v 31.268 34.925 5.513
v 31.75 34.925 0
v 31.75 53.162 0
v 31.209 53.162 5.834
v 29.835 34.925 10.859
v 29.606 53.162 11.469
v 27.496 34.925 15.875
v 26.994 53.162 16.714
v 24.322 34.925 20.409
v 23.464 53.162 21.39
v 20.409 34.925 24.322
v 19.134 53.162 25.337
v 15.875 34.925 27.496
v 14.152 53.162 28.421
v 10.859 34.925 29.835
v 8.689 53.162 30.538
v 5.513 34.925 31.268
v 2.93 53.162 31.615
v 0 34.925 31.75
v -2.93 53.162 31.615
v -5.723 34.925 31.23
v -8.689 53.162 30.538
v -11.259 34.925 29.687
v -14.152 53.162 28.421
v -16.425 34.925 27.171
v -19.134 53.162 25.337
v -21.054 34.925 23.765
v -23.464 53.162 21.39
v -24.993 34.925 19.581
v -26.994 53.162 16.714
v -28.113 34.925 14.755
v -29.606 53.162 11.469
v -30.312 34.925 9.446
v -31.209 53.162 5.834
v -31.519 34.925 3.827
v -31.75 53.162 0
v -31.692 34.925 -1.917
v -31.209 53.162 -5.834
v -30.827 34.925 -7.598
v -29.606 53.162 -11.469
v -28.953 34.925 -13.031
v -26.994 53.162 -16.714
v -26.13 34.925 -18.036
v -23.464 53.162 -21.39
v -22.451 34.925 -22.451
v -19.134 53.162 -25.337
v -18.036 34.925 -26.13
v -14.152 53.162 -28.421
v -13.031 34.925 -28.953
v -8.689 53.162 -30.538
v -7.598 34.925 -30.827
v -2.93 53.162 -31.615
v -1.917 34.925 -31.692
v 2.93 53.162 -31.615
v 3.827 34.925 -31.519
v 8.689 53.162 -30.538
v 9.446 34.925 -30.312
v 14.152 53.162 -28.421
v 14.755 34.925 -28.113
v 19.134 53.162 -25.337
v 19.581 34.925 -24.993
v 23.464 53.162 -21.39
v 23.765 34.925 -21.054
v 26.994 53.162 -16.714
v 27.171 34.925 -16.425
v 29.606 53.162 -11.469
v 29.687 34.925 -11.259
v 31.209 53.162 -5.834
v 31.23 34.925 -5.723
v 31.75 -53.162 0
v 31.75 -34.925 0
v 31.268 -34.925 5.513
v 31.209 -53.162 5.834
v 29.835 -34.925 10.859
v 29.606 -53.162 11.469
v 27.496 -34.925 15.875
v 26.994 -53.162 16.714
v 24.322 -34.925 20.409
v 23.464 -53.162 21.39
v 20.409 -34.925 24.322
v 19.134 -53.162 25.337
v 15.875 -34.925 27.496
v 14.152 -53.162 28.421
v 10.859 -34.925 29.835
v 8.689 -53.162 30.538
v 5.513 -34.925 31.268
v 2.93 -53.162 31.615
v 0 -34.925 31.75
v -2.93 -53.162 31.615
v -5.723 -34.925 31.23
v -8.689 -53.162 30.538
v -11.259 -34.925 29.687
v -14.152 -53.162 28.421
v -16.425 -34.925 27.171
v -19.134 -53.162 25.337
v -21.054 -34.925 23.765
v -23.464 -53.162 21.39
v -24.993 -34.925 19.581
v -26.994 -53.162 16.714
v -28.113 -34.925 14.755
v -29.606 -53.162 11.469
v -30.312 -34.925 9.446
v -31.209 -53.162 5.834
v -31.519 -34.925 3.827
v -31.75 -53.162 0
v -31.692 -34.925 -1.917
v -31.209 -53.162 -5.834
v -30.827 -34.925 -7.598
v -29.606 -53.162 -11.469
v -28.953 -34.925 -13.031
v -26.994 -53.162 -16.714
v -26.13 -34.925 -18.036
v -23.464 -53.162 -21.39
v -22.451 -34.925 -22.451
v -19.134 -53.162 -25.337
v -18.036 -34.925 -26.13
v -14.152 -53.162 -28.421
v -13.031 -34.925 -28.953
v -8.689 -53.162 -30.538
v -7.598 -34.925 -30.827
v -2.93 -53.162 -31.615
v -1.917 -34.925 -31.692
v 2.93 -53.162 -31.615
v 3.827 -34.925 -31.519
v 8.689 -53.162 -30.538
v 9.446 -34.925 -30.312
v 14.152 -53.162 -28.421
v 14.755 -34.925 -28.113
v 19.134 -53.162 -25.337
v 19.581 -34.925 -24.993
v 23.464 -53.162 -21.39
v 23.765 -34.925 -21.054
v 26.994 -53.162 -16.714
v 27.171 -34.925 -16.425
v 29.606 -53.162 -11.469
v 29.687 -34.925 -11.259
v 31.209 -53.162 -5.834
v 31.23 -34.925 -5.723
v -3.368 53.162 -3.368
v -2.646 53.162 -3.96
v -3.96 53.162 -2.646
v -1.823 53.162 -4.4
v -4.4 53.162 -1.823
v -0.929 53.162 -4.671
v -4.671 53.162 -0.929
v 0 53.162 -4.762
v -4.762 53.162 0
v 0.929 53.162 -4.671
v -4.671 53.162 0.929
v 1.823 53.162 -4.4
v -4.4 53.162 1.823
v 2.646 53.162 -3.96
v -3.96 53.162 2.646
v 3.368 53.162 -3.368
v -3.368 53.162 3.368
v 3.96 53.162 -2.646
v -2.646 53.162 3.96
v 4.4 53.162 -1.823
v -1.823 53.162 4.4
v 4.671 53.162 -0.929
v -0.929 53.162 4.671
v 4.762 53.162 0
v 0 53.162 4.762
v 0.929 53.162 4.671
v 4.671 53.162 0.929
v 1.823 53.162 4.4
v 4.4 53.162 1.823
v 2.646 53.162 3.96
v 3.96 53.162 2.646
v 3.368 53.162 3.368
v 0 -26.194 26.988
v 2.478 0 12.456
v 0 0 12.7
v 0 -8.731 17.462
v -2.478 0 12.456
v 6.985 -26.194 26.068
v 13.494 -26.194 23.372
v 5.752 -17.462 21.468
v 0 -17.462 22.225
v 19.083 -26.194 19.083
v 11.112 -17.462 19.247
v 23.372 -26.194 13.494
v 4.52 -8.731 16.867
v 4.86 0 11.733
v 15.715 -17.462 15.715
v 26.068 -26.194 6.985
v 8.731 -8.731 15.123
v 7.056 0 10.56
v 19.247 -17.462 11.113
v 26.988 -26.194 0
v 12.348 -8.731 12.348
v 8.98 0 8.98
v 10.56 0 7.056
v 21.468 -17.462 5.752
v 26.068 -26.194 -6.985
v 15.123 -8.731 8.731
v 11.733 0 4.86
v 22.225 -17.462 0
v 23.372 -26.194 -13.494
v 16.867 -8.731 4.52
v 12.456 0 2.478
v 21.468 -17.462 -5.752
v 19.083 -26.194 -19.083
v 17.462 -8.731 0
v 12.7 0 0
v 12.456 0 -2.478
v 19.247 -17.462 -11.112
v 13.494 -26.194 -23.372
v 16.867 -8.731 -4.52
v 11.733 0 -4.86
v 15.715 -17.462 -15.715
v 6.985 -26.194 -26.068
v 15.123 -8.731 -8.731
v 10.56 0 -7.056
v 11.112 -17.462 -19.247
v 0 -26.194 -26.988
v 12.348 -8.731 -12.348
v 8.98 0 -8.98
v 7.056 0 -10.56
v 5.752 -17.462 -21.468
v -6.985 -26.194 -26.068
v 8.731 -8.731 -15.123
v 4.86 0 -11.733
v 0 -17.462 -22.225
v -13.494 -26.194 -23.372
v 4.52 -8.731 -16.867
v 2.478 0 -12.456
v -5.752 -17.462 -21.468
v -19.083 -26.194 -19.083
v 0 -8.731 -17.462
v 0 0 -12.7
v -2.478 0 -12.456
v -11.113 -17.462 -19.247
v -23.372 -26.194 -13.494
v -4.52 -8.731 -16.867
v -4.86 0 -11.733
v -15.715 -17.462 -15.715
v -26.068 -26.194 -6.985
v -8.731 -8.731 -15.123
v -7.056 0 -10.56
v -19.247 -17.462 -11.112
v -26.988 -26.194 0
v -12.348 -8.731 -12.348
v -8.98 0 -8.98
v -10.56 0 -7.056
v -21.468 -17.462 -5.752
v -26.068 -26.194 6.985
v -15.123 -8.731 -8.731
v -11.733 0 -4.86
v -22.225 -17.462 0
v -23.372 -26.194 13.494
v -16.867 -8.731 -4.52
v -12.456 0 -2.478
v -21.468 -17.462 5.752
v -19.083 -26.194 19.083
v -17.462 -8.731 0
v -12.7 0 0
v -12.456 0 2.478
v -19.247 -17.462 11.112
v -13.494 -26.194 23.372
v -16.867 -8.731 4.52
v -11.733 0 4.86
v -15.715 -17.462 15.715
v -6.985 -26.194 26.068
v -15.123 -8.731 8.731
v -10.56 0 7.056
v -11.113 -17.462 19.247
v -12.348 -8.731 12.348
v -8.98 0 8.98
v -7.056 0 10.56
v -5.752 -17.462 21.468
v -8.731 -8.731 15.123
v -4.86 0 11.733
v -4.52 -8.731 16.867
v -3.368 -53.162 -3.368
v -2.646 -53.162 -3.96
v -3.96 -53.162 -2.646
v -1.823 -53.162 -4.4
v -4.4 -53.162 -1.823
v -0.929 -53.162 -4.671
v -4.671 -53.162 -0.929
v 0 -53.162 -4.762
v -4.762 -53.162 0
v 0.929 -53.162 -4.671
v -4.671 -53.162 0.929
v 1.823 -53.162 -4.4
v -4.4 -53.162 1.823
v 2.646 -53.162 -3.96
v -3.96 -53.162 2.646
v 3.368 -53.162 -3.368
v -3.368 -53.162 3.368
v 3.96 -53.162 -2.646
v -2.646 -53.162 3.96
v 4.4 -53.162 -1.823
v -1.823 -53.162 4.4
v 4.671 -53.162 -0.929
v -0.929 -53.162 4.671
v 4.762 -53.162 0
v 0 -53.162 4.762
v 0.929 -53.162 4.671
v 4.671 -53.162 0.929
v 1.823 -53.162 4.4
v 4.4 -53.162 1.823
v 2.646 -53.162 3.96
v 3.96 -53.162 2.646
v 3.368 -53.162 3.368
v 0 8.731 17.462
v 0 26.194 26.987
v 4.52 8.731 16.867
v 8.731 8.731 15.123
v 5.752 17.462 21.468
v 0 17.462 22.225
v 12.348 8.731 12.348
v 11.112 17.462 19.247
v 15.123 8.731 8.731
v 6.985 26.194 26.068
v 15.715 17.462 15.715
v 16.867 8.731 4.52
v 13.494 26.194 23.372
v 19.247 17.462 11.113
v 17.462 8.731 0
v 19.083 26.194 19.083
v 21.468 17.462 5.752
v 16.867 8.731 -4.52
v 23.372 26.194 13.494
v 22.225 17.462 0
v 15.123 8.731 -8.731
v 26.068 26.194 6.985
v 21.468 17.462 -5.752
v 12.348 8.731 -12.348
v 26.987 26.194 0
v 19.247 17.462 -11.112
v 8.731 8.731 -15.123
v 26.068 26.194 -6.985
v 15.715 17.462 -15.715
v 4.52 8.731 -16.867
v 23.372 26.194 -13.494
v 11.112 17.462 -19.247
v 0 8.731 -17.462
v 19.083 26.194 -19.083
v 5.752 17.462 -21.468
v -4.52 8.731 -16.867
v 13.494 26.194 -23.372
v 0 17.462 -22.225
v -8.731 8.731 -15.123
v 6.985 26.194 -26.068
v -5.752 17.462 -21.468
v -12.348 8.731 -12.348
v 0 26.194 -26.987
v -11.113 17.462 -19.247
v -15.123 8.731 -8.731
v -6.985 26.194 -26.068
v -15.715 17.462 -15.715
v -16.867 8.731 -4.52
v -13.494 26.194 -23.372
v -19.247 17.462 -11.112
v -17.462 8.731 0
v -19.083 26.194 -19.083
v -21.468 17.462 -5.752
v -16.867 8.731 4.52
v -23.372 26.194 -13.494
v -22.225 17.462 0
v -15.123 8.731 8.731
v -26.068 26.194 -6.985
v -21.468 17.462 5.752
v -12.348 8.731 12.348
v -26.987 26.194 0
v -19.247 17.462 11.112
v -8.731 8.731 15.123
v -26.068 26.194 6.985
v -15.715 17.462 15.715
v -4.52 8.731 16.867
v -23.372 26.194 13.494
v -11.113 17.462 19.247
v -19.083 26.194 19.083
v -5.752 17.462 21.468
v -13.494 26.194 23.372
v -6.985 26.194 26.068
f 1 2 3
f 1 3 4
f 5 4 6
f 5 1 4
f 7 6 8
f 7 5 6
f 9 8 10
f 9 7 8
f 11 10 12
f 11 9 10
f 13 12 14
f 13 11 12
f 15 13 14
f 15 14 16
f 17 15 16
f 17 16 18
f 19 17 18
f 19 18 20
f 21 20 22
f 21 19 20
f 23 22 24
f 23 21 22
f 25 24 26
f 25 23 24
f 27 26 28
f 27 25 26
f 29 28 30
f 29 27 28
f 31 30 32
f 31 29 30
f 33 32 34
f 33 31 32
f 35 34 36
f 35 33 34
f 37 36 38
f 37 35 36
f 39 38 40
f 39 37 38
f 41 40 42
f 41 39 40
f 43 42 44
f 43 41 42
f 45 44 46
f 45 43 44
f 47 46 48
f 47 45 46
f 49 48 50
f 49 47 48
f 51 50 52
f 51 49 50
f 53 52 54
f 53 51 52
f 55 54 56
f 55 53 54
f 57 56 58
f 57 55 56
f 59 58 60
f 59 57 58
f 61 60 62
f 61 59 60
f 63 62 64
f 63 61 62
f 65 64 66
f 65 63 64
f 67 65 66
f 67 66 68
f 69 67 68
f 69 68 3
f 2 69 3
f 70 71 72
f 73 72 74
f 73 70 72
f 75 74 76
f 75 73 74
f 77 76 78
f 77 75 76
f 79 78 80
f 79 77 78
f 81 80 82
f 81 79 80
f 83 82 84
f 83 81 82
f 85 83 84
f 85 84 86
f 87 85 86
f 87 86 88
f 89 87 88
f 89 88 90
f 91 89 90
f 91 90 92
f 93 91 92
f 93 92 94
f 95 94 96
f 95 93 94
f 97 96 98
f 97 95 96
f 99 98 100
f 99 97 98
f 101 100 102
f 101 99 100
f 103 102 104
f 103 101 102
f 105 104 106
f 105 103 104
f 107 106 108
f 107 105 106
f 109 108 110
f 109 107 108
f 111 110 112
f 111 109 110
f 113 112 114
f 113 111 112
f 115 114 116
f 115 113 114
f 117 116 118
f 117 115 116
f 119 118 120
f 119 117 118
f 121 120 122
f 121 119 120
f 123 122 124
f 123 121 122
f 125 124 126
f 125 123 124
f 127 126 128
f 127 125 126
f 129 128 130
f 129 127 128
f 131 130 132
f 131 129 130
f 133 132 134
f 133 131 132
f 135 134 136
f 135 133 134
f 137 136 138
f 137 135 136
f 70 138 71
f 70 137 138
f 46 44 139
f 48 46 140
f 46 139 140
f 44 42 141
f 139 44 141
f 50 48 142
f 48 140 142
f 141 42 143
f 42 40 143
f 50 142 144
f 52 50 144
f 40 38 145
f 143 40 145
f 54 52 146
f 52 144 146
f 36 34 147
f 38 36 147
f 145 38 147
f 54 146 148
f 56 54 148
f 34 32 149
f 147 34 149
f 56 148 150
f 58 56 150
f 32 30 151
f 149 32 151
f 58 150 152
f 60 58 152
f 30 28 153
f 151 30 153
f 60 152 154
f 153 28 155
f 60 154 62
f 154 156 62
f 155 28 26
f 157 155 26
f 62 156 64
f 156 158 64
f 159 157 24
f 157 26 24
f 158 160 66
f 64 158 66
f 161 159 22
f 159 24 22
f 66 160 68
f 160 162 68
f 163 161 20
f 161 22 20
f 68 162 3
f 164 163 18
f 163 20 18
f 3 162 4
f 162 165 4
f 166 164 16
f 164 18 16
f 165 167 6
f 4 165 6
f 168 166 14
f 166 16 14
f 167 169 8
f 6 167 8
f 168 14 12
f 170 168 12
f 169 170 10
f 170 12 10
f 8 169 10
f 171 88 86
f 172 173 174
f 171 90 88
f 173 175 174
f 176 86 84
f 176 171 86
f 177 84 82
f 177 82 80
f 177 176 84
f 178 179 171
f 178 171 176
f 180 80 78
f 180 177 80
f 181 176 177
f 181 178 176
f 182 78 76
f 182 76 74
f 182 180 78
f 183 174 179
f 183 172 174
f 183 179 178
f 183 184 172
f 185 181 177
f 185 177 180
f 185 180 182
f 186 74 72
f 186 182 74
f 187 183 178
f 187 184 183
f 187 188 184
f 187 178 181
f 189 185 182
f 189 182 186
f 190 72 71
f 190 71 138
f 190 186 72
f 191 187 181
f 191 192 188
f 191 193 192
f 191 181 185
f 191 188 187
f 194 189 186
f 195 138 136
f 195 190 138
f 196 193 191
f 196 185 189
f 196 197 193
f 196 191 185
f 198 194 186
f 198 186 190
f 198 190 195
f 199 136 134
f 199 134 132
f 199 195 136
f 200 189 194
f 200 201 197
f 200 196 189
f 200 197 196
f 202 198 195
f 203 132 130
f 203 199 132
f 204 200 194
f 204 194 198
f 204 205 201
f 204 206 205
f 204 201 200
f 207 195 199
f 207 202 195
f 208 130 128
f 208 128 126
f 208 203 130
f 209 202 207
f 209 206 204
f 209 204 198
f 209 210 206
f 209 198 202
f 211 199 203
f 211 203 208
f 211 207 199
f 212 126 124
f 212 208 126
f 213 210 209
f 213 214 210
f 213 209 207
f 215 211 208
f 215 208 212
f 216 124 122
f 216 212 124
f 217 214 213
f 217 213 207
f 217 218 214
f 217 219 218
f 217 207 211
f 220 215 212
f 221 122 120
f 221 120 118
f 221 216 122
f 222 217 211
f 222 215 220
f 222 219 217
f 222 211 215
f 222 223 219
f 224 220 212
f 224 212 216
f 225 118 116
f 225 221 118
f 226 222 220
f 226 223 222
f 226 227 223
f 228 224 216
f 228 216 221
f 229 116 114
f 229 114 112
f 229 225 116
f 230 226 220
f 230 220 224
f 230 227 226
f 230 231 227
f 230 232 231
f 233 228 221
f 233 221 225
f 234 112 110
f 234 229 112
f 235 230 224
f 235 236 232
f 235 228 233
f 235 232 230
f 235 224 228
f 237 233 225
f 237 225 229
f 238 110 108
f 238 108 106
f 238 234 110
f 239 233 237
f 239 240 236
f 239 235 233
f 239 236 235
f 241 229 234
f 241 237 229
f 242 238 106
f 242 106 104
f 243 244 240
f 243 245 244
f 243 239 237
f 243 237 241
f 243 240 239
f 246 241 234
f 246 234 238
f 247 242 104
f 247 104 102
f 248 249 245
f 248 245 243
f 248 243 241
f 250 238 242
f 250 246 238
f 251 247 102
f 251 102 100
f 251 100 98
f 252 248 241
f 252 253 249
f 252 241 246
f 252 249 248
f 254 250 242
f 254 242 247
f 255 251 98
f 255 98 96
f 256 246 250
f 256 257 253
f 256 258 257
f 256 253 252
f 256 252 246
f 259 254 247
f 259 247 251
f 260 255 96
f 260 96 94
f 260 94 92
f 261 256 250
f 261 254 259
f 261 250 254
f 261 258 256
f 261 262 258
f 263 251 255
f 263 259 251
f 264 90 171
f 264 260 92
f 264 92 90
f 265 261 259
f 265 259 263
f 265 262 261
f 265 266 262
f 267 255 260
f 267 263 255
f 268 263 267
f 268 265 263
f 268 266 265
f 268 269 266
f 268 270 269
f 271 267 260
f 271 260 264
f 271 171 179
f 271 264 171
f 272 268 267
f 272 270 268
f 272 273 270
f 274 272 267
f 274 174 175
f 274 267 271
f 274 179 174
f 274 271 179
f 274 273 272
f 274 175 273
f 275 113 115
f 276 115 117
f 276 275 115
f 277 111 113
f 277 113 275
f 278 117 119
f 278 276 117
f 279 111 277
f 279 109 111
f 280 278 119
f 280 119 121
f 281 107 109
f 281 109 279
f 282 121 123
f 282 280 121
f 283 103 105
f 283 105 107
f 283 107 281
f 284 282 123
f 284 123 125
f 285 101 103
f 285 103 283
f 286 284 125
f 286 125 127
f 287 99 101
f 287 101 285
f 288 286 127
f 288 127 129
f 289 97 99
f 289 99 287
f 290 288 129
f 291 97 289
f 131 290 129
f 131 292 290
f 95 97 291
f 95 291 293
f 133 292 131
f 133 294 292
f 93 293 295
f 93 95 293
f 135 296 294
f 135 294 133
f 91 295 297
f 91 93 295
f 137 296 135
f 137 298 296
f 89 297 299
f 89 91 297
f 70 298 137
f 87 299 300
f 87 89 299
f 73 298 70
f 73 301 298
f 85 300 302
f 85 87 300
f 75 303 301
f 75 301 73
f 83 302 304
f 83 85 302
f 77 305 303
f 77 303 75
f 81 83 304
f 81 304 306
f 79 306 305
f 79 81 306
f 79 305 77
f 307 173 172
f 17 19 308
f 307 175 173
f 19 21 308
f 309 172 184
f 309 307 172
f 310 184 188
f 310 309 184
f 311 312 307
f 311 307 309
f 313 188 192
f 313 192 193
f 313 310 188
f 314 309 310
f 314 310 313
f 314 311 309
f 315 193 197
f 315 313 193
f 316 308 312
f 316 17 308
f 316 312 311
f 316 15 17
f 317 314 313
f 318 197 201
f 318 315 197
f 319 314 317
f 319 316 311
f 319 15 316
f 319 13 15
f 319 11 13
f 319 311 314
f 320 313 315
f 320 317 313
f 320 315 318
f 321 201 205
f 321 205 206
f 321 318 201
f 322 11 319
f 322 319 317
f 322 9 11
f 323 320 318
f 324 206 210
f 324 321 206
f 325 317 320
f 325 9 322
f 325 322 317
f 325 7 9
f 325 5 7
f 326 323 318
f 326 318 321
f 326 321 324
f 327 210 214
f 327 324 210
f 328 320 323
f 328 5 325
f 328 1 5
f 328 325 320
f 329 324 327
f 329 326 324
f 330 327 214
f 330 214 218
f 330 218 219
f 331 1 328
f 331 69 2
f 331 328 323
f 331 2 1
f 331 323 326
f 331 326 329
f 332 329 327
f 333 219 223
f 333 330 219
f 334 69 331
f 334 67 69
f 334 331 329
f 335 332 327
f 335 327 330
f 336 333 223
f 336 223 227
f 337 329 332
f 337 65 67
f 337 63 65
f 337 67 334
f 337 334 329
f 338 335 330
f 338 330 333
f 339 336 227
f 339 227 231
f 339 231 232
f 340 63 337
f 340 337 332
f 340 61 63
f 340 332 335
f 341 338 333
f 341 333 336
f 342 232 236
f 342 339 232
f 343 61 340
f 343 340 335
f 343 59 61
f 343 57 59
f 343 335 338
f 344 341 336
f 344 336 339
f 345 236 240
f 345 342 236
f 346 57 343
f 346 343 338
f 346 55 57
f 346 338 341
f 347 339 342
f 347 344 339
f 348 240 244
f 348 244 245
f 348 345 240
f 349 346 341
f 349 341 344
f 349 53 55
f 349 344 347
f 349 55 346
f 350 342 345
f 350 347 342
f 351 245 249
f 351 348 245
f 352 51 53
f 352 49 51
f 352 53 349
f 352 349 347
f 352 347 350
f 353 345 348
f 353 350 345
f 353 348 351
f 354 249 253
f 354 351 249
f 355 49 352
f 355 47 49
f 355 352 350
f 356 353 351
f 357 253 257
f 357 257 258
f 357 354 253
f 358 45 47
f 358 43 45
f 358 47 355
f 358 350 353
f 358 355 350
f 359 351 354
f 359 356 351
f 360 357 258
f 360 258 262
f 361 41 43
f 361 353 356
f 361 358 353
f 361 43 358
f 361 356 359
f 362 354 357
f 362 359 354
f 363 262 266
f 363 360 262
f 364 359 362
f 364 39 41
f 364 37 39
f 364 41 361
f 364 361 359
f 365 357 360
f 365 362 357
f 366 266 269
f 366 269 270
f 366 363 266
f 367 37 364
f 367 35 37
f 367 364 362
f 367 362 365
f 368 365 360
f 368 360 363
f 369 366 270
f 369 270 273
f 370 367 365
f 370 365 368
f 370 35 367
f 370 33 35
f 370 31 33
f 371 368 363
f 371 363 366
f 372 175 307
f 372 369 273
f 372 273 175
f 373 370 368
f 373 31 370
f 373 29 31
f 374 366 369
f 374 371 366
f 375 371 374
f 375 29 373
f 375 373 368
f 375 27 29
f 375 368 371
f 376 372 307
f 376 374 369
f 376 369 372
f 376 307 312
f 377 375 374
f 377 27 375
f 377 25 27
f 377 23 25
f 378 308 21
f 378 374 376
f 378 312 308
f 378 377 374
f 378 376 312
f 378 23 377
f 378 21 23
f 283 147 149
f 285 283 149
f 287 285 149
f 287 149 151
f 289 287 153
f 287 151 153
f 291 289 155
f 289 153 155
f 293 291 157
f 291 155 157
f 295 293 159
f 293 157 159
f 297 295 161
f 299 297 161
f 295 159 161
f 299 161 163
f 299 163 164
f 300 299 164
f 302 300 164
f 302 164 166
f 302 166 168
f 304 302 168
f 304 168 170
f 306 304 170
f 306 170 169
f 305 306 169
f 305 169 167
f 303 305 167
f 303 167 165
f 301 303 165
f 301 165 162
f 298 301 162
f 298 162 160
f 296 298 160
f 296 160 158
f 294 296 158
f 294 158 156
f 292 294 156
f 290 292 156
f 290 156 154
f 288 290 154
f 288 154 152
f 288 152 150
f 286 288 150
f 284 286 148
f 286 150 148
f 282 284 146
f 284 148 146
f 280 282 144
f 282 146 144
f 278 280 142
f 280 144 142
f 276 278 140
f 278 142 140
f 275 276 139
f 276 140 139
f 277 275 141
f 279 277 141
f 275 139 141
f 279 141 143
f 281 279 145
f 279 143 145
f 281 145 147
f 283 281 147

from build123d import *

# Parameters (mm, degrees)
F0_R     = 31.75
F1_DEPTH = 53.1622
F5_D     = 9.525


with BuildPart() as f1:
    # F0 (on Front) → F1 (new body, symmetric)
    with BuildSketch(Plane.XZ):
        Circle(F0_R)
    extrude(amount=F1_DEPTH, both=True)

    # F2 (on Right) → F3 (revolve, cut)
    with BuildSketch(Plane.YZ):
        Polygon((34.925, 31.75), (0, 31.75), (0, 12.7), align=None)
        Polygon((0, 12.7), (0, 31.75), (-34.925, 31.75), align=None)
    revolve(axis=Axis((0, 0, 0), (0, 1, 0)), mode=Mode.SUBTRACT)

    # F5 (through all)
    with Locations(Plane.XZ.offset(53.1622)):
        with Locations((0, 0)):
            Hole(F5_D / 2)


solid = f1.part
